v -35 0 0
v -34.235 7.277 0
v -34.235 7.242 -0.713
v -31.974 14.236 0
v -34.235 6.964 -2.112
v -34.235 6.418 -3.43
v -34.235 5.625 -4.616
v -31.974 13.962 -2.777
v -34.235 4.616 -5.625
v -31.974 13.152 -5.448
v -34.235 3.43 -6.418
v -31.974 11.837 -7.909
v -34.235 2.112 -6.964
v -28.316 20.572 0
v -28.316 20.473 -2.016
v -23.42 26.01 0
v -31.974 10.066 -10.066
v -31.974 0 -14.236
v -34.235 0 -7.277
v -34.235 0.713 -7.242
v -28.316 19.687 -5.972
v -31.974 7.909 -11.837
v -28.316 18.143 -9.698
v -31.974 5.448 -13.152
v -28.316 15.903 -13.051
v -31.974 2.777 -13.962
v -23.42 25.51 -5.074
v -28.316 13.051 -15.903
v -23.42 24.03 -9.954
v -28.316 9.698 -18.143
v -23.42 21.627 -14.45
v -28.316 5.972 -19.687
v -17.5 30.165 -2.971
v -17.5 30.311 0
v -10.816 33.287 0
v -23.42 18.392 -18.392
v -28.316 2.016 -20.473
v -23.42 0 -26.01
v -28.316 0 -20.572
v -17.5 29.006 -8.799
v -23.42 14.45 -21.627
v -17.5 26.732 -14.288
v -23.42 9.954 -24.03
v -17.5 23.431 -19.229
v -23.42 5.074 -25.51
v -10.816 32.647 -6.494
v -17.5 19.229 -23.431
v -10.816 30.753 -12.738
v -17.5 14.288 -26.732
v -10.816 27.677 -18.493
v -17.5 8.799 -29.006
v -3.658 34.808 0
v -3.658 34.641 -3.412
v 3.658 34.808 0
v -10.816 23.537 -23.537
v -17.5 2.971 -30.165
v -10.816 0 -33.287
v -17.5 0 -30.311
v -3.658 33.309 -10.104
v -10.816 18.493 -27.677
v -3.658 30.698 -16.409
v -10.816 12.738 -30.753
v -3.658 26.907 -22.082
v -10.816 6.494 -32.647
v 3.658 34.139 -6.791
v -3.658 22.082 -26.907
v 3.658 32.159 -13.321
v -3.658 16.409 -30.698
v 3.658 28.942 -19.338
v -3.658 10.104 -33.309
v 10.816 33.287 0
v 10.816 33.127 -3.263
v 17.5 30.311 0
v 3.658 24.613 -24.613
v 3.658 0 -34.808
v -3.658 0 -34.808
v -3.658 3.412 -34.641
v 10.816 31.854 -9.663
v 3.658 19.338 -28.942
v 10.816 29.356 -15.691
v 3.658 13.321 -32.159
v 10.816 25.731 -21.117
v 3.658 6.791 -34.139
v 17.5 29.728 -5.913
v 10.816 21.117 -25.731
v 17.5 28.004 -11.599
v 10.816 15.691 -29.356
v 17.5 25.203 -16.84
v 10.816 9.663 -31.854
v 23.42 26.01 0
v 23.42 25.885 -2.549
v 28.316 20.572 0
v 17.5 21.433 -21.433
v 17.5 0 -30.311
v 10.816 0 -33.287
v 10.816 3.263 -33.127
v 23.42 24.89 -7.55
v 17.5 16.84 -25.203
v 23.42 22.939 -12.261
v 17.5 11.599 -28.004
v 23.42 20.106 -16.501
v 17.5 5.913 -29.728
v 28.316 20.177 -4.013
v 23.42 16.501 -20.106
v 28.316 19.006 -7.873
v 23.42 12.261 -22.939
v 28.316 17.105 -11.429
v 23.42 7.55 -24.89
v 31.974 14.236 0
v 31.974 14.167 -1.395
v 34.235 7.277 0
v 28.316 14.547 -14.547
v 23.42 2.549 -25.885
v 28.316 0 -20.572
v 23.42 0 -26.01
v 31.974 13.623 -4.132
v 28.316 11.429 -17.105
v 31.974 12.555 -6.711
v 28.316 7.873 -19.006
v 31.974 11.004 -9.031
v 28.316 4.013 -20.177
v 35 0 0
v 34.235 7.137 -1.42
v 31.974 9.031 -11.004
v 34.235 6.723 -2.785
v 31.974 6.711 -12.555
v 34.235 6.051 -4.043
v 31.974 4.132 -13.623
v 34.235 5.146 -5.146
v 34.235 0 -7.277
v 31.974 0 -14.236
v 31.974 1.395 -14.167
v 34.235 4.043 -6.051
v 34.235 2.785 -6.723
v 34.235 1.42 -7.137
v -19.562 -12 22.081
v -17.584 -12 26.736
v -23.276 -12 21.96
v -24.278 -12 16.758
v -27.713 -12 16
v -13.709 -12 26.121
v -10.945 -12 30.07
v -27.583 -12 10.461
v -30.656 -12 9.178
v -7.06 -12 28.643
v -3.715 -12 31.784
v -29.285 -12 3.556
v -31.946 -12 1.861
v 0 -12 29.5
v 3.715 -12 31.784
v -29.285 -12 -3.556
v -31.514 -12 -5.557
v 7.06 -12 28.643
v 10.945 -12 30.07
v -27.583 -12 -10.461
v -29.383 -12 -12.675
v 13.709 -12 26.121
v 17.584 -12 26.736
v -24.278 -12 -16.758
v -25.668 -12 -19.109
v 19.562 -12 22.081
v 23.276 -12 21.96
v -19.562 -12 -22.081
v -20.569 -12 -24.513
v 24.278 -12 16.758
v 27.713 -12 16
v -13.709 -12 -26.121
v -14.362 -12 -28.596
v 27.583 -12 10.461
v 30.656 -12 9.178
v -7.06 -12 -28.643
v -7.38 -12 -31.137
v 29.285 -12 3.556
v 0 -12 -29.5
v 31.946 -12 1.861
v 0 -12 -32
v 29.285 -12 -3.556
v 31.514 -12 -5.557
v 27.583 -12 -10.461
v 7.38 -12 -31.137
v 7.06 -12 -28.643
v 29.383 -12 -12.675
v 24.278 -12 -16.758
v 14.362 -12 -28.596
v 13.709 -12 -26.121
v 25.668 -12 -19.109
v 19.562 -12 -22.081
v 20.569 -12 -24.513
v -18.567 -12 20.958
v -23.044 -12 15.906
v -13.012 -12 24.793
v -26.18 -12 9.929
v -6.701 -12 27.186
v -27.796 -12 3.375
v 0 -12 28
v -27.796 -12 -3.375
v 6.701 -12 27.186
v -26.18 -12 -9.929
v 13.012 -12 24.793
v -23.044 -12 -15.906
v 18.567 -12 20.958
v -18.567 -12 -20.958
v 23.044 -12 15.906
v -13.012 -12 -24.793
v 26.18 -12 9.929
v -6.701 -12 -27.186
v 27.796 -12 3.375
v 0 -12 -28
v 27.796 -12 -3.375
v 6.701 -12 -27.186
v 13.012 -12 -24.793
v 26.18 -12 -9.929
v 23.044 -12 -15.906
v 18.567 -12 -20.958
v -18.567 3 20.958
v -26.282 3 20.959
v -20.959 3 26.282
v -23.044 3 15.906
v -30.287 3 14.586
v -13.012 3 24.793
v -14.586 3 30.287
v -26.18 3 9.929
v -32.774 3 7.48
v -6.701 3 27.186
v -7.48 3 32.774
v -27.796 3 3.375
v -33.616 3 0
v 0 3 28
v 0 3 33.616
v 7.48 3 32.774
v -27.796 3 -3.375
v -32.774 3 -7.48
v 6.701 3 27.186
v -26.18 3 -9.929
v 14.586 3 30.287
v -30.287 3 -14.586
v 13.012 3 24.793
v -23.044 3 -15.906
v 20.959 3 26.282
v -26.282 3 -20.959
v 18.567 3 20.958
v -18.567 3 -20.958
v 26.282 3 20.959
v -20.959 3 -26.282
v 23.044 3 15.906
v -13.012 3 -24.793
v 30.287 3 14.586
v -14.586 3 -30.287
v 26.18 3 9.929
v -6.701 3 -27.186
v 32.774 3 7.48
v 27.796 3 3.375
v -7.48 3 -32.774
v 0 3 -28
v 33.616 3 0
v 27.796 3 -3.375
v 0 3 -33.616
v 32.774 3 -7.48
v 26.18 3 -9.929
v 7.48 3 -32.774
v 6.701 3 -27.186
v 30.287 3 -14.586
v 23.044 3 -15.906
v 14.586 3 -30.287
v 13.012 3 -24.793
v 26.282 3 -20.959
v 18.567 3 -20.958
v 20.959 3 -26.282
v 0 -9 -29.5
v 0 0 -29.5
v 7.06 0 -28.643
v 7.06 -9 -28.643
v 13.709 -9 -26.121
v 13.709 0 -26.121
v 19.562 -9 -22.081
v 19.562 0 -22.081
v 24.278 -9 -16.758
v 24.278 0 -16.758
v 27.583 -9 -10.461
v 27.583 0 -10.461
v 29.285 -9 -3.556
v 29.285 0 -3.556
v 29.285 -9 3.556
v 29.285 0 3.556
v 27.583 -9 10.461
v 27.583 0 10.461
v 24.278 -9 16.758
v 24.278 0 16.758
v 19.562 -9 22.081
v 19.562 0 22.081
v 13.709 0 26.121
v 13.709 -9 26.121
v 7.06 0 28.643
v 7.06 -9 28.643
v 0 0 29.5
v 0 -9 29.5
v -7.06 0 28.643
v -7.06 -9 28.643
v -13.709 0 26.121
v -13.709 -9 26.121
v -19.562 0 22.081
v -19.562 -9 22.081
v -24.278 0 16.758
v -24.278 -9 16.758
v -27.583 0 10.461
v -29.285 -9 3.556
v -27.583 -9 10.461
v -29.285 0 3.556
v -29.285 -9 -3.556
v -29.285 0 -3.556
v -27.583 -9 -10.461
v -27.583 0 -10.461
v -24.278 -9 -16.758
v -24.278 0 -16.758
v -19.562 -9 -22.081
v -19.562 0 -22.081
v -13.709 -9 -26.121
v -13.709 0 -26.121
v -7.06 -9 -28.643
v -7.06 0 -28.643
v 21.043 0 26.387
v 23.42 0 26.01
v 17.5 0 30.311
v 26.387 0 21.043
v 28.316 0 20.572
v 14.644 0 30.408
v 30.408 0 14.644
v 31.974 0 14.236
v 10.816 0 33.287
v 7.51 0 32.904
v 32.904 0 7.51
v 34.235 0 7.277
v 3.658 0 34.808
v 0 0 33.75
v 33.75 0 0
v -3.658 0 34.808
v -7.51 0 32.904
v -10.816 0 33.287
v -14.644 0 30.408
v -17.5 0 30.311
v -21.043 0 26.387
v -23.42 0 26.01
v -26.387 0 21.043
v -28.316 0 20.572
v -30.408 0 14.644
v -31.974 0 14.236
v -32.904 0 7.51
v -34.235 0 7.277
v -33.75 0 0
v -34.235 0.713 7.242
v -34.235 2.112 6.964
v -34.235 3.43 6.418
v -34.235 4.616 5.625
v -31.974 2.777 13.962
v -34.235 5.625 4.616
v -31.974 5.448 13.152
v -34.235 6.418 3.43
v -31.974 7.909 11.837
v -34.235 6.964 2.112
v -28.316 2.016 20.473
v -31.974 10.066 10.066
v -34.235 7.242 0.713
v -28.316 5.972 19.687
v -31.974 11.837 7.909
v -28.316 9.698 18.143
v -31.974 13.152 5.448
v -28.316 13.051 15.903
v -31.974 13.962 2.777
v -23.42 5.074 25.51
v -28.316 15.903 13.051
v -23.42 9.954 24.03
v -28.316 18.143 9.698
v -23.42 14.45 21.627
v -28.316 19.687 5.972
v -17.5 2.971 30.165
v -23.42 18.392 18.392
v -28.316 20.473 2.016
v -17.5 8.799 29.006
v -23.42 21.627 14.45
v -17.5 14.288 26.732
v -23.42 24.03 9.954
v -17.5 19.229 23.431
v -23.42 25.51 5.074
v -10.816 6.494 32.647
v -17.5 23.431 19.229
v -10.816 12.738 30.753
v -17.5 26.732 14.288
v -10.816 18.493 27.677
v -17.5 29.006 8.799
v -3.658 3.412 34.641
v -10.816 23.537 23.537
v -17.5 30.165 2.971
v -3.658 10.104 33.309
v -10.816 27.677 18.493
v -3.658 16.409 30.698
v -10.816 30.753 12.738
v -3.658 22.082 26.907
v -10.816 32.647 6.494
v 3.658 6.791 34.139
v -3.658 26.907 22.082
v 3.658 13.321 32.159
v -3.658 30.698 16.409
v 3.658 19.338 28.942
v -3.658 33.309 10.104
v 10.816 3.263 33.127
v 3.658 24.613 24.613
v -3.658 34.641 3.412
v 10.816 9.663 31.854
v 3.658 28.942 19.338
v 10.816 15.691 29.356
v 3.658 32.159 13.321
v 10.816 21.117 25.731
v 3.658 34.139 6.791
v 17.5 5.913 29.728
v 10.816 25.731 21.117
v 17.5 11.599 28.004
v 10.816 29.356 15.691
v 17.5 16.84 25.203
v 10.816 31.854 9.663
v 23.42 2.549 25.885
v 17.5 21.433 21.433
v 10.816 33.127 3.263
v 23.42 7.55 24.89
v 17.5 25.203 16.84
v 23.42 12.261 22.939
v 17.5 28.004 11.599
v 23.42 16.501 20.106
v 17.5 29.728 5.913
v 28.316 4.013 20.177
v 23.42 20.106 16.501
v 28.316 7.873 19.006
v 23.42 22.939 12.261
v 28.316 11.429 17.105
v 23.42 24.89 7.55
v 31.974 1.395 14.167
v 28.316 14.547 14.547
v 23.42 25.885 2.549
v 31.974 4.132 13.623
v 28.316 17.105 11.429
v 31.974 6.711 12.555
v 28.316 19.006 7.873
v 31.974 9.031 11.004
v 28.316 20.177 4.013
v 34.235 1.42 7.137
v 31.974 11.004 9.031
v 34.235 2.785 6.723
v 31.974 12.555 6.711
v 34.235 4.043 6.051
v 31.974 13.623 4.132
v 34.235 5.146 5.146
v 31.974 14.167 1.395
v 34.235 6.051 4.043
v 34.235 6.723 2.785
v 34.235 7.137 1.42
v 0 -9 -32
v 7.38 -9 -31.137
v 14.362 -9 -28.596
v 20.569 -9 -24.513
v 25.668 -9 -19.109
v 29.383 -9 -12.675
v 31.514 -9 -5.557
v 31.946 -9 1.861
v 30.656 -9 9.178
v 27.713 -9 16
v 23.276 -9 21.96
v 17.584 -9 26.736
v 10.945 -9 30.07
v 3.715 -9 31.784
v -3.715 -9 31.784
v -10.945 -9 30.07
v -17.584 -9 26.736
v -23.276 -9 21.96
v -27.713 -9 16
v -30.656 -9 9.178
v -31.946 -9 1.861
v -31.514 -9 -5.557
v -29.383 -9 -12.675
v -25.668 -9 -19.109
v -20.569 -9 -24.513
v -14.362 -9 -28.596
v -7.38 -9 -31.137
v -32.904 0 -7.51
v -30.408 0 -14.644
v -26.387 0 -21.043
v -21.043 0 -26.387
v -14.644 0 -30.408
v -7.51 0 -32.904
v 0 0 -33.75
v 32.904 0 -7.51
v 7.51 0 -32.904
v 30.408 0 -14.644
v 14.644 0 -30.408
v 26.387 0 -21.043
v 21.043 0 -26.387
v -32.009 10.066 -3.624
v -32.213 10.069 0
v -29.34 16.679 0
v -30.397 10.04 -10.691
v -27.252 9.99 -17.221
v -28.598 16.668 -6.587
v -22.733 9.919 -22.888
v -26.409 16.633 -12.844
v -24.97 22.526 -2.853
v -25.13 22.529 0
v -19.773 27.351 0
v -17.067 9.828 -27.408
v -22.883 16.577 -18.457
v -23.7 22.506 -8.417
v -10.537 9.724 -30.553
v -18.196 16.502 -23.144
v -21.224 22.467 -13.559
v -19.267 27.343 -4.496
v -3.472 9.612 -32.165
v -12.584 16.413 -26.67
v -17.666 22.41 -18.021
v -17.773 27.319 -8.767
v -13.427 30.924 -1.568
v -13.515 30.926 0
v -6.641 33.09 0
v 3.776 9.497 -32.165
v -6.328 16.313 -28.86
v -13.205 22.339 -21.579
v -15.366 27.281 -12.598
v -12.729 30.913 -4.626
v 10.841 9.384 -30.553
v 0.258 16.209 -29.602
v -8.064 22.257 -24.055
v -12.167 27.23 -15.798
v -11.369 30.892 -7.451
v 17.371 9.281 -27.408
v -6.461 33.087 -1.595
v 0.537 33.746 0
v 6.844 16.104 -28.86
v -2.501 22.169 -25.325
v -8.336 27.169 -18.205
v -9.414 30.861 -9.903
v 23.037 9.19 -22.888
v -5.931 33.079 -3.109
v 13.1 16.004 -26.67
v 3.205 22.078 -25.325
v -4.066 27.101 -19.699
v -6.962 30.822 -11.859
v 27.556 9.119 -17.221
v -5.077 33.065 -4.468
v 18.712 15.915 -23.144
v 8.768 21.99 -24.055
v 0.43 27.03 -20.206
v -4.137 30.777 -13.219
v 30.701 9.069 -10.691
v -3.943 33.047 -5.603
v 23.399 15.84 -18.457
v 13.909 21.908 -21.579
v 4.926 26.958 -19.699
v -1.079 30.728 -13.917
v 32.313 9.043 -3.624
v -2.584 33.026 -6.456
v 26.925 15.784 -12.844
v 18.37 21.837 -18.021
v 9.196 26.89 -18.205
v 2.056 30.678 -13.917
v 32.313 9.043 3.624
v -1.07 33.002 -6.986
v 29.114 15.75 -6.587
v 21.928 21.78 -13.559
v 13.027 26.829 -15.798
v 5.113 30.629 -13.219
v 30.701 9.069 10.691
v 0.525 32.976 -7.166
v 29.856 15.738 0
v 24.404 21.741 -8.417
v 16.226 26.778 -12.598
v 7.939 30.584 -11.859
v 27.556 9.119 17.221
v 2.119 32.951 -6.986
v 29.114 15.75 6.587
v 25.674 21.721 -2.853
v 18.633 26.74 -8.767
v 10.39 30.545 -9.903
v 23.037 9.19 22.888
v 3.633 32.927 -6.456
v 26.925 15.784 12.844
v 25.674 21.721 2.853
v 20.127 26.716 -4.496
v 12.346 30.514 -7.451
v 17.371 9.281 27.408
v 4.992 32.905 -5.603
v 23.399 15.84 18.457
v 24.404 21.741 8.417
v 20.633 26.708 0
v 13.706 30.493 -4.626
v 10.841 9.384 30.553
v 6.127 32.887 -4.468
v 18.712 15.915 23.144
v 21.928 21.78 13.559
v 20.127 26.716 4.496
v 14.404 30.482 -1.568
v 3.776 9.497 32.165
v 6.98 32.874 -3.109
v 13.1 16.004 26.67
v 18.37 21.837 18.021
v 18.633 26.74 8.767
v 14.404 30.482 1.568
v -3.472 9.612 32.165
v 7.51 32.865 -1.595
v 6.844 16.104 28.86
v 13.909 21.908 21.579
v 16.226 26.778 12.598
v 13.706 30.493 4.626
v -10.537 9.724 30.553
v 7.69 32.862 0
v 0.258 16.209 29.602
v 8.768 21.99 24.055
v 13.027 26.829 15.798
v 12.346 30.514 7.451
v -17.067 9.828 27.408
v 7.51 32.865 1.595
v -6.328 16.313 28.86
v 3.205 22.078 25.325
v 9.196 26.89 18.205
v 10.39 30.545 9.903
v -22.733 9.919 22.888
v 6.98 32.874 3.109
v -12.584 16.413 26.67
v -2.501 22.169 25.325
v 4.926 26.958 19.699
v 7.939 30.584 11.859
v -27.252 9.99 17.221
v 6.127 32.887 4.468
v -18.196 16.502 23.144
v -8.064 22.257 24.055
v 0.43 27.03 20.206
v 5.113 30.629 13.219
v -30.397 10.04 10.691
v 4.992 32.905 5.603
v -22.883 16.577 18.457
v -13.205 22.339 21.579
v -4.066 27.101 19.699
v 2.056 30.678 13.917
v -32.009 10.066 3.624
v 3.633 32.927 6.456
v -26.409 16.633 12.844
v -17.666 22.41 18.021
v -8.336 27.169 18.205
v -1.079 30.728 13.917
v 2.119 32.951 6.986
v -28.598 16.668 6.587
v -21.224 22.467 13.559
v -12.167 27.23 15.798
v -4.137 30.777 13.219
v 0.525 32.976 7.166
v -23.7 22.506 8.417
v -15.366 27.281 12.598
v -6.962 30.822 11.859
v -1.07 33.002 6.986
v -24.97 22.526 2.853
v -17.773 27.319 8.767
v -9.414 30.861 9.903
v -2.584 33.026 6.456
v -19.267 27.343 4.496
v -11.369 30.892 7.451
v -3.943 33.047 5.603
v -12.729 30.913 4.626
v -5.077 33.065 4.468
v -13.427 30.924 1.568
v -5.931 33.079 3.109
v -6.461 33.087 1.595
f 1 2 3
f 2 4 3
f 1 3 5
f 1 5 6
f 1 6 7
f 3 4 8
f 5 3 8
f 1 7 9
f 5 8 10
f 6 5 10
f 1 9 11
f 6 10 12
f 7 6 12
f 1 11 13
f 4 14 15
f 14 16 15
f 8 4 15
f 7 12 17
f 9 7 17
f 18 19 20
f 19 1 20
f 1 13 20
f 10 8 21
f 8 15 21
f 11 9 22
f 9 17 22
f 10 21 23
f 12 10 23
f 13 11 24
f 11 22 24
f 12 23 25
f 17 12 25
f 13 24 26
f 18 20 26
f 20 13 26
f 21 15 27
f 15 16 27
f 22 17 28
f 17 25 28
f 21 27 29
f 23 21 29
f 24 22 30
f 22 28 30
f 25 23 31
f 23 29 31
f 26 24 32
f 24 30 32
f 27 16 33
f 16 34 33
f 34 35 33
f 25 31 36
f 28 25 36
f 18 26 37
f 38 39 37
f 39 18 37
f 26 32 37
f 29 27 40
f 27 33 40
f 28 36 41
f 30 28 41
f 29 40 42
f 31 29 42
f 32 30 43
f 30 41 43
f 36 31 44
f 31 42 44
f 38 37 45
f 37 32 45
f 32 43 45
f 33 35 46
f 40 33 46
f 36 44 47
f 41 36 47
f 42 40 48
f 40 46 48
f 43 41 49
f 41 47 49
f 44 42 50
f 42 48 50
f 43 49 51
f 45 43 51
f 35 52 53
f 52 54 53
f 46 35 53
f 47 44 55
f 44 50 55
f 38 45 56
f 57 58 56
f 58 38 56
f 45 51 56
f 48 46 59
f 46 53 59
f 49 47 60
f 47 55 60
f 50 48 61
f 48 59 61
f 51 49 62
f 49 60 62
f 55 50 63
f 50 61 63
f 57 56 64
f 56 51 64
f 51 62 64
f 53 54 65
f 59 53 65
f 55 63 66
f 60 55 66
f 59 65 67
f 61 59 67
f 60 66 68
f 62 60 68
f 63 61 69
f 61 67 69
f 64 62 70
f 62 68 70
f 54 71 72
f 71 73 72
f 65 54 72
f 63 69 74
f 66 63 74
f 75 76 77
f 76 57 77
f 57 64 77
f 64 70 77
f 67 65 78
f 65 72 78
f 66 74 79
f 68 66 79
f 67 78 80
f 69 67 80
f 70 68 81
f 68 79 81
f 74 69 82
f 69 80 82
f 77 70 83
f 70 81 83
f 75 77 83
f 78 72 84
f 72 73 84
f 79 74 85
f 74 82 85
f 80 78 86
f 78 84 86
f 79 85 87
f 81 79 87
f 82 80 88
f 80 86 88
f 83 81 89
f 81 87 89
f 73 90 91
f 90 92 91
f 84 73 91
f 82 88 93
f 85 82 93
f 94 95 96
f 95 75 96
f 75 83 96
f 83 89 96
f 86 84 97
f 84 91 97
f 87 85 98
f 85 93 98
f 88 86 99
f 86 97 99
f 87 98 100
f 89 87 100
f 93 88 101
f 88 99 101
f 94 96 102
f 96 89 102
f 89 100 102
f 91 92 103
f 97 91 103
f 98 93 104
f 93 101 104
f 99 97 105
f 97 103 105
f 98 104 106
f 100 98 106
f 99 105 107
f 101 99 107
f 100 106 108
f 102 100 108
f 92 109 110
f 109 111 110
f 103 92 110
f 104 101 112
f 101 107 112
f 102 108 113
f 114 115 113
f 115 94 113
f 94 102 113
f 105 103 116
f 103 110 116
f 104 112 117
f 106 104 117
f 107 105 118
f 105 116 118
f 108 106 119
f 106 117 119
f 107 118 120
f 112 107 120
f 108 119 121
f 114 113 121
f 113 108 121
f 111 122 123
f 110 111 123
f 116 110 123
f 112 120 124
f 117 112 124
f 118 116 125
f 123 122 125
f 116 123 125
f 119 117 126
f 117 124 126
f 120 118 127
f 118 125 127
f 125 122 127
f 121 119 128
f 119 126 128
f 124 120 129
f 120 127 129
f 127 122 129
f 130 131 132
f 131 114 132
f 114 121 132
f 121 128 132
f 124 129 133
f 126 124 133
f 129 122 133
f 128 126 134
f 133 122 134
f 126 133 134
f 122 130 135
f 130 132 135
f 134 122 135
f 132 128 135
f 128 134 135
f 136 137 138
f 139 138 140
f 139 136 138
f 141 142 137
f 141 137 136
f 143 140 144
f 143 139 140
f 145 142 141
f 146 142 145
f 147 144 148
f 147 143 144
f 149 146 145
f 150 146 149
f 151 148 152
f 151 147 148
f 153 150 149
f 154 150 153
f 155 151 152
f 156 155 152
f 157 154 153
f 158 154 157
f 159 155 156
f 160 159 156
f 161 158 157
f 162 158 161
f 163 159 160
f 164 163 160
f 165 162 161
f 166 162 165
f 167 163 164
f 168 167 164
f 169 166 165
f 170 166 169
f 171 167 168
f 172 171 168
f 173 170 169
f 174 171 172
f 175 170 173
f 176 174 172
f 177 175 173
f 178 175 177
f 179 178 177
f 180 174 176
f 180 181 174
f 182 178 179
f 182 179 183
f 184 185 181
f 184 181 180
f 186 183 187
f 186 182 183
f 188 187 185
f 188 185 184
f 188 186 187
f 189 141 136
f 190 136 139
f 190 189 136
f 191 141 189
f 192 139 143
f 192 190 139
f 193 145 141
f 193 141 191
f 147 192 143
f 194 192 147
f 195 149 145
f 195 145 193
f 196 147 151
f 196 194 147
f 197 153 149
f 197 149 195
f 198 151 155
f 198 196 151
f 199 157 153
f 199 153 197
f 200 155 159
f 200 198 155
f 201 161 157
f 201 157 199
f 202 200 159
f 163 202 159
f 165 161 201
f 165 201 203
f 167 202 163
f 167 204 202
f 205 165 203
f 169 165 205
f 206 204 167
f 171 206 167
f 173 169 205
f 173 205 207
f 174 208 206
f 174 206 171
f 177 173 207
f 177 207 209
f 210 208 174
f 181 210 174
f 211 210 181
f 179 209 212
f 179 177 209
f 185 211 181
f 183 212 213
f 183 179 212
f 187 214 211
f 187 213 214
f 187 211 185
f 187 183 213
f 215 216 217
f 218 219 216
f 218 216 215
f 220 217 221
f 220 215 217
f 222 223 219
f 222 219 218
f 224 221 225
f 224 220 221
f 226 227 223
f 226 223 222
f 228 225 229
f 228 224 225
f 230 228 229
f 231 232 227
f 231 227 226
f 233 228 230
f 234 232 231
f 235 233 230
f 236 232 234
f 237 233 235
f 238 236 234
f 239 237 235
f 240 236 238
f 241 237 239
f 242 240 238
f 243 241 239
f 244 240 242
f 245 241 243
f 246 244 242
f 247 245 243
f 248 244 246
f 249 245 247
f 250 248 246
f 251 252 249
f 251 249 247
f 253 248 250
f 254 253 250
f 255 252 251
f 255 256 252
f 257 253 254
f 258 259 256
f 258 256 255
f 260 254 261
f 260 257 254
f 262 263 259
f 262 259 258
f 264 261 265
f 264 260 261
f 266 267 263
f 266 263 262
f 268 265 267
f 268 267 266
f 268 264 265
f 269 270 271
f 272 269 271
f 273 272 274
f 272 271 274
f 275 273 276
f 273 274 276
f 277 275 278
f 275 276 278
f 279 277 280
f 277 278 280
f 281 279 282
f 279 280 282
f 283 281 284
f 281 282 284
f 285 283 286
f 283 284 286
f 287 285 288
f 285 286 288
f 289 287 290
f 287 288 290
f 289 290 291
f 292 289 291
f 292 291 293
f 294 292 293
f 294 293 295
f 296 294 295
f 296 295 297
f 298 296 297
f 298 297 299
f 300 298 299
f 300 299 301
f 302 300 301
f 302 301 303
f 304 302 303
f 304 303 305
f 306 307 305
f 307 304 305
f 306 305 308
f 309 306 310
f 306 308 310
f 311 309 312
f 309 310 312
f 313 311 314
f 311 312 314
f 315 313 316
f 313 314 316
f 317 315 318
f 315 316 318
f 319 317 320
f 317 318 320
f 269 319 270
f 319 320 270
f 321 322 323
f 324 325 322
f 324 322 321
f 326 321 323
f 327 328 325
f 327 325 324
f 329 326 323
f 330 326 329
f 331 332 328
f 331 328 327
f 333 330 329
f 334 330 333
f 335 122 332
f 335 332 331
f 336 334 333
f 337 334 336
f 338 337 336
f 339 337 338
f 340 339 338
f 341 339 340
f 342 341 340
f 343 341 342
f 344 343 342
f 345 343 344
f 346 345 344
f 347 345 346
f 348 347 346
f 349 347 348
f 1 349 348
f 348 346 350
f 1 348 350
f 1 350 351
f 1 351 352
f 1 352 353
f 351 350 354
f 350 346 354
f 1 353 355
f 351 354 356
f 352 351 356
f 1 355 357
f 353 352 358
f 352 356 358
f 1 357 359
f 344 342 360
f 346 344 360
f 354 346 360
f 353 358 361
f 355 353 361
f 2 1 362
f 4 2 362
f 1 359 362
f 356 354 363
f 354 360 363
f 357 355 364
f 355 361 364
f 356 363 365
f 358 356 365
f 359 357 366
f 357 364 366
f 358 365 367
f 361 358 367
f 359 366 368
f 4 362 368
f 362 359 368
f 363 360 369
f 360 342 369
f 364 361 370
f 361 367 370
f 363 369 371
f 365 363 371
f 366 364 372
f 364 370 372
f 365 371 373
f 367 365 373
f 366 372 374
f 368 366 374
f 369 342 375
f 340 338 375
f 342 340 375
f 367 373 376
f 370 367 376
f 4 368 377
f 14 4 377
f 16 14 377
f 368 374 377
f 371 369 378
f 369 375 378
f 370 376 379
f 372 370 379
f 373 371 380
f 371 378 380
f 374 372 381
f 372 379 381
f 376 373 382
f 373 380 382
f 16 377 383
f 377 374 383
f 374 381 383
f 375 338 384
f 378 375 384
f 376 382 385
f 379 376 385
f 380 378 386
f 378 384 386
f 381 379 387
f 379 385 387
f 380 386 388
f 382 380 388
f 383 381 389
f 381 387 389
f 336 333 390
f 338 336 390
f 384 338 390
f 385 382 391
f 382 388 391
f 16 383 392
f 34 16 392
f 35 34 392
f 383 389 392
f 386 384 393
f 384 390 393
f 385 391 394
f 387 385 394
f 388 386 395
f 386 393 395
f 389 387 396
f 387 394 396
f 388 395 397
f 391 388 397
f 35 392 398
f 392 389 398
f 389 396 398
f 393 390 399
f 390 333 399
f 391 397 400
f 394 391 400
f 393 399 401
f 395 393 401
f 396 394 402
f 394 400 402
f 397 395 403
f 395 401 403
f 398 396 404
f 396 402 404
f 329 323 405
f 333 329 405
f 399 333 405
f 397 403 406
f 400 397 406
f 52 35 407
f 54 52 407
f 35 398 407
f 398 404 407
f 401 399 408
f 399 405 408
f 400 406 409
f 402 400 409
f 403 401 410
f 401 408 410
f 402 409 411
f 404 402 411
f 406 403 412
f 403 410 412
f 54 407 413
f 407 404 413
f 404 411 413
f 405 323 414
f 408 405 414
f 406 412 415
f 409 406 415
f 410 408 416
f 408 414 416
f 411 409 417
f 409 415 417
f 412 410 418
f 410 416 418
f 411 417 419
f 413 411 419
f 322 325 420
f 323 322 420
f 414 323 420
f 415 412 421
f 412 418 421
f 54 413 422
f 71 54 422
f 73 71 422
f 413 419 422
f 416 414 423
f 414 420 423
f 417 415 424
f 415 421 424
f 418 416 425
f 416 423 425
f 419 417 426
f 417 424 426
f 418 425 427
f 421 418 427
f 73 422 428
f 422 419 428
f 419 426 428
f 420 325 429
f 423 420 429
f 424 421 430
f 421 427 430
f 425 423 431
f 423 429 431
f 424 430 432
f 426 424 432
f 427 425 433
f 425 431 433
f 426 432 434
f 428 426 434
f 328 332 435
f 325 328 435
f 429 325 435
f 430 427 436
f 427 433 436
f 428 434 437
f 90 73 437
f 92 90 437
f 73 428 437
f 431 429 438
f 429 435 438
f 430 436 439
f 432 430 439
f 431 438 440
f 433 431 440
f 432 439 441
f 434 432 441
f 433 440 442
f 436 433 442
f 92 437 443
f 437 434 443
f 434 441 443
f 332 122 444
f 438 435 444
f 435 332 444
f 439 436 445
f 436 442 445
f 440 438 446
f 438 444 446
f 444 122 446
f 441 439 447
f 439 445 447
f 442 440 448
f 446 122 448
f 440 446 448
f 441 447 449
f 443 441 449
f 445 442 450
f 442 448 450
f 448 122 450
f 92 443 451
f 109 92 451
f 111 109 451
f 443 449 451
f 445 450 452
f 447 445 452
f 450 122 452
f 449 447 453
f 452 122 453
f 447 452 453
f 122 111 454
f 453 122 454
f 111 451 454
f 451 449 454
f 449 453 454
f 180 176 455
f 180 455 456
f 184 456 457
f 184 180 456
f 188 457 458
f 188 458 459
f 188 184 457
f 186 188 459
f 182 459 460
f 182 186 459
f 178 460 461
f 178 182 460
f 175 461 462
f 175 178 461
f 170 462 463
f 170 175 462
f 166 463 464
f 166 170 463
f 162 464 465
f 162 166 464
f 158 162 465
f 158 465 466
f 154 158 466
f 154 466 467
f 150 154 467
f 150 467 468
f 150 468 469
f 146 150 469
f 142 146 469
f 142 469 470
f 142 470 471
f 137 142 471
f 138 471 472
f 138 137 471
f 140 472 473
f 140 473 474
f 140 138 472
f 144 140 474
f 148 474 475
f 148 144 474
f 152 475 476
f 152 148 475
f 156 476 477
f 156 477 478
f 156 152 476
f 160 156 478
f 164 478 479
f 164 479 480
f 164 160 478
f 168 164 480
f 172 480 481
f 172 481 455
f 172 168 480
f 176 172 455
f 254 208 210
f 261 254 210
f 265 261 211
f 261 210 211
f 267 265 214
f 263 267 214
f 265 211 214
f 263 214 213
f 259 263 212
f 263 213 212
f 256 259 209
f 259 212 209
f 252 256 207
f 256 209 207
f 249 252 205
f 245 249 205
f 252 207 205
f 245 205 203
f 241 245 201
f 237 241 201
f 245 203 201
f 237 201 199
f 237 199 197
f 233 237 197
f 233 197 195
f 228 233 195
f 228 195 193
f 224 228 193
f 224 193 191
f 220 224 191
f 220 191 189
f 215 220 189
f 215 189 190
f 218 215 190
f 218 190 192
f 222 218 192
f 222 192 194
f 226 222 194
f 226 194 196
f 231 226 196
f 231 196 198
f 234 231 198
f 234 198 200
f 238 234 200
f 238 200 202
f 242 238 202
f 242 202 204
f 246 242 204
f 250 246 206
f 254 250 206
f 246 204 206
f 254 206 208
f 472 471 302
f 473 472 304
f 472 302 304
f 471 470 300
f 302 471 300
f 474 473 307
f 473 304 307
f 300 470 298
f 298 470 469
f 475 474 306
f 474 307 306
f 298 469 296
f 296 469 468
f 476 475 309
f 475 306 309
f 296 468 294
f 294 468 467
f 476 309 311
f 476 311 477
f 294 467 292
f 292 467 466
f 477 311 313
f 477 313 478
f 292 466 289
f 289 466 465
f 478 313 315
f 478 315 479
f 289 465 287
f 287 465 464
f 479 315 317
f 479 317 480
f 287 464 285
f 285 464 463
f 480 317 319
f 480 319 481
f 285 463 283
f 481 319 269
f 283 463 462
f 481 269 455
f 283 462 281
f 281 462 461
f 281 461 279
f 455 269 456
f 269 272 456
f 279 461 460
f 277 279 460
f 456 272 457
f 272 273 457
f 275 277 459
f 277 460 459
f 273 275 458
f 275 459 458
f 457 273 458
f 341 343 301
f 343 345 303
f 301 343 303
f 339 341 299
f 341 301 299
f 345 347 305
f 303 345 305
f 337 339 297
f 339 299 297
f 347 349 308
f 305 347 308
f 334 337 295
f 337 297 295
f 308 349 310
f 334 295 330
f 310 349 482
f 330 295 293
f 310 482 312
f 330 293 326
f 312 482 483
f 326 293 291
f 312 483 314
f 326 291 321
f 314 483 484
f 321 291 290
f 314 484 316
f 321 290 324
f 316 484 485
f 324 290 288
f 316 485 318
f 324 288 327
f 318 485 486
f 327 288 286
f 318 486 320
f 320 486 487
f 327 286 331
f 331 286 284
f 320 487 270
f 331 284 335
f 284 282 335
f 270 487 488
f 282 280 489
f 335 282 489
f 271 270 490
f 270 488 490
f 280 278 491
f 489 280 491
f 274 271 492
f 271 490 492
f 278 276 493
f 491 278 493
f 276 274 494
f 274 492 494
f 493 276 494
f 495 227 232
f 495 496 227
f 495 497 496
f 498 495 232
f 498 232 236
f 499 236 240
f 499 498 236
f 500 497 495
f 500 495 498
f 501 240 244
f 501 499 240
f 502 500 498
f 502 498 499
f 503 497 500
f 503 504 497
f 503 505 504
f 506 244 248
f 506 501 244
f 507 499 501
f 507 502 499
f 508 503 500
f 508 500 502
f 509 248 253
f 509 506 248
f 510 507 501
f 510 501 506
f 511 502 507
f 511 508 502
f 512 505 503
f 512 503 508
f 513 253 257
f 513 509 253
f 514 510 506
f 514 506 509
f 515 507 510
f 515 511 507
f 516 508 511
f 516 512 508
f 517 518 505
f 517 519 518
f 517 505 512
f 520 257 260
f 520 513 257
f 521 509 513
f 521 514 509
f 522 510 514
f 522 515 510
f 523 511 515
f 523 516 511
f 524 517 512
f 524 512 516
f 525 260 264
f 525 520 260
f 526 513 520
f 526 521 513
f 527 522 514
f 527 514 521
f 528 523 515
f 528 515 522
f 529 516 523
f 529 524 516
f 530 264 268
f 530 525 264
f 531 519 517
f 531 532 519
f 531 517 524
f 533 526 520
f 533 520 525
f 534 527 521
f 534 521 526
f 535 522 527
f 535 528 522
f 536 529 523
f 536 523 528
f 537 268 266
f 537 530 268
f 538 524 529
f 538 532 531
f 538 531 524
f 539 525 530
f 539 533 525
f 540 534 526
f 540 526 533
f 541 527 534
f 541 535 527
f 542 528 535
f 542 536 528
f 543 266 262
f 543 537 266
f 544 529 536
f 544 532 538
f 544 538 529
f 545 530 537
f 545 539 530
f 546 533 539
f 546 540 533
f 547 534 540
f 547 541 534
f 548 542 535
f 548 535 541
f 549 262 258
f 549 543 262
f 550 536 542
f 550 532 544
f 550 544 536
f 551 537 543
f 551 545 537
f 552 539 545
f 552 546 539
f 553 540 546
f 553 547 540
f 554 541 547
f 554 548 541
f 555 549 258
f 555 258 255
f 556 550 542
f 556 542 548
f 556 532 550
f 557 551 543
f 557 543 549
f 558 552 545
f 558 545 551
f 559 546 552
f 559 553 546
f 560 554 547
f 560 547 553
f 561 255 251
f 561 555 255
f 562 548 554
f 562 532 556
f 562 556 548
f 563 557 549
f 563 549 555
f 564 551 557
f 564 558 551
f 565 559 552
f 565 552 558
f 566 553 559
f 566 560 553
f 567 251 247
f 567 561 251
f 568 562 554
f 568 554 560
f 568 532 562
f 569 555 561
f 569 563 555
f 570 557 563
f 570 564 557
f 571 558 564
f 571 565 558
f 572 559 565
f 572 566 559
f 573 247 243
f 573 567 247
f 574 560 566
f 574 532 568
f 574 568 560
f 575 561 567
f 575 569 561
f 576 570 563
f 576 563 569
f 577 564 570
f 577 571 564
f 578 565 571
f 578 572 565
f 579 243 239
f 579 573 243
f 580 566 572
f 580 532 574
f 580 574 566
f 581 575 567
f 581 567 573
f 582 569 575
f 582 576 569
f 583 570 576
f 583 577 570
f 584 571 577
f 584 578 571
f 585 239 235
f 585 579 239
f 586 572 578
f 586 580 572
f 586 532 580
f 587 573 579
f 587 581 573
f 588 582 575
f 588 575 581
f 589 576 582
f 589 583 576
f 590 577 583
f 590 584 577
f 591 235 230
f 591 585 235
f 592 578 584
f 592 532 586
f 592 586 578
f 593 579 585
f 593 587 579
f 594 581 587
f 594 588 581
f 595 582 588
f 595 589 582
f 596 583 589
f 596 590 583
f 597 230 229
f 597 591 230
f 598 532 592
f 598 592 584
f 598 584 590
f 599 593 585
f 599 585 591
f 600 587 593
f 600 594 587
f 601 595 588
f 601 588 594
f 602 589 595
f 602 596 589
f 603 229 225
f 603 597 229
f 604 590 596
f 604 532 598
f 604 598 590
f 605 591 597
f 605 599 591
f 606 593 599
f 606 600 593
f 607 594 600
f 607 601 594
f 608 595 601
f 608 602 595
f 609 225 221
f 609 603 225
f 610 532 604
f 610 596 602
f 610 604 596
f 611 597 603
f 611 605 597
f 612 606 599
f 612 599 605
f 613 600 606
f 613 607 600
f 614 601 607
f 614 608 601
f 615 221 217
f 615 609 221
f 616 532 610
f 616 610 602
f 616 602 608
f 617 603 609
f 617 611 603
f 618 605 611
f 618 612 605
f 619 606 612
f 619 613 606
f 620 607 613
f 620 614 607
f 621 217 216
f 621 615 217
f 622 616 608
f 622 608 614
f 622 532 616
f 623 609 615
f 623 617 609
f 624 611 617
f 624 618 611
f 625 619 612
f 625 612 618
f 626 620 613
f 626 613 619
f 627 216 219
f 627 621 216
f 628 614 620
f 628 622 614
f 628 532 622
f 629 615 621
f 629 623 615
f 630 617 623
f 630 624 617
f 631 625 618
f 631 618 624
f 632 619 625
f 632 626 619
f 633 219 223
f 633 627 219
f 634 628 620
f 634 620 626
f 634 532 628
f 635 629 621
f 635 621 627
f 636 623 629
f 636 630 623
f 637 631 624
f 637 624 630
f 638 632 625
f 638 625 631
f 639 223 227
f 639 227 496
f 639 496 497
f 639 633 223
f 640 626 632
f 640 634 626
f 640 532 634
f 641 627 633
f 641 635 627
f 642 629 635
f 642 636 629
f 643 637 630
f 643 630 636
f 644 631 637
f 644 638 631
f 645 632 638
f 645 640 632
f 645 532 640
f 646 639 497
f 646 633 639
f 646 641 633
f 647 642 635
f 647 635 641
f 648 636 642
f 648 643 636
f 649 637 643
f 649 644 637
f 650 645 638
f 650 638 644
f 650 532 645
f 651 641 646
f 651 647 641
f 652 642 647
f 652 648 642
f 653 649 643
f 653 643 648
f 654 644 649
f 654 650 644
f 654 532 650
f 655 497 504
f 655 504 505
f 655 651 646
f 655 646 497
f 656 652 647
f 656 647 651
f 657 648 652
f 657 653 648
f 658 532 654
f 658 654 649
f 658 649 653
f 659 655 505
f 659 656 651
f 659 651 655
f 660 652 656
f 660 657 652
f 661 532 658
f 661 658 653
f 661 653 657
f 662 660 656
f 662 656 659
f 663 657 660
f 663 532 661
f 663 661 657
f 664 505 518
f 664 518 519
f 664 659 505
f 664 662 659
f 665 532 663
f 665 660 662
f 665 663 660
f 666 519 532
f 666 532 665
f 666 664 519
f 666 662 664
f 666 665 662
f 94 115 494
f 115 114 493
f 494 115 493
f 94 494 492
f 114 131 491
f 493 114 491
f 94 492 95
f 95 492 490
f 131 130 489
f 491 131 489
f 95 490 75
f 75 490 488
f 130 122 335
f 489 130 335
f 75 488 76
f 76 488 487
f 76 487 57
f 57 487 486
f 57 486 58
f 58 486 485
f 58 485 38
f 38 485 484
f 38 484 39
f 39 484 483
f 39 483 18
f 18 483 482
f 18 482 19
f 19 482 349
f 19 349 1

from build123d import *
from build123d.topology import SkipClean

# Parameters (mm, degrees)
CUT_REVOLVE2_ANGLE      = 180
BOSS_EXTRUDE1_START     = -0.0001
BOSS_EXTRUDE1_OUTLINE_R = 33.75
BOSS_EXTRUDE1_DEPTH     = 3.0001
SKETCH7_R               = 29.5
BOSS_EXTRUDE2_DEPTH     = 12
SKETCH8_R               = 32
BOSS_EXTRUDE3_DEPTH     = 3
SKETCH9_R               = 28
CUT_EXTRUDE1_DEPTH      = 16


# Read off the part's stored shape, not the designer's step: Boss-Extrude1
with BuildPart() as part:
    # Sketch1 → Revolve1 (revolve)
    with BuildSketch(Plane.XY):
        with BuildLine():
            Line((35, 0), (-35, 0))
            ThreePointArc((-35, 0), (0, 35), (35, 0))
        make_face()
    revolve(axis=Axis((35, 0, 0), (-1, 0, 0)))

    # Sketch3 → Cut-Revolve1 (revolve, cut)
    with BuildSketch(Plane.XY):
        with BuildLine():
            Line((0.536808441, 33.745730644), (-0.536808441, -33.745730644))
            ThreePointArc((-0.536808441, -33.745730644), (-33.745730644, 0.536808441), (0.536808441, 33.745730644))
        make_face()
    revolve(axis=Axis((0.536808441, 33.745730644, 0), (-0.015905435294566866, -0.9998735005629914, 0)), mode=Mode.SUBTRACT)

    # Sketch5 → Cut-Revolve2 (revolve, cut)
    with SkipClean():  # the faces are left unmerged after this step: merging them gives an invalid solid
        with BuildSketch(Plane(origin=(0, 0, 0), x_dir=(1, 0, 0), z_dir=(0, 1, 0))):
            with BuildLine():
                Line((-35, 0), (35, 0))
                ThreePointArc((35, 0), (0, -35), (-35, 0))
            make_face()
        revolve(axis=Axis((-35, 0, 0), (1, 0, 0)), revolution_arc=CUT_REVOLVE2_ANGLE, mode=Mode.SUBTRACT)

    # Boss-Extrude1 outline → Boss-Extrude1 (add)
    with SkipClean():  # the faces are left unmerged after this step: merging them gives an invalid solid
        with BuildSketch(Plane(origin=(0, 0, 0), x_dir=(1, 0, 0), z_dir=(0, 1, 0)).offset(BOSS_EXTRUDE1_START)):
            Circle(BOSS_EXTRUDE1_OUTLINE_R)
        extrude(amount=BOSS_EXTRUDE1_DEPTH)

    # Sketch7 → Boss-Extrude2 (add)
    with SkipClean():  # the faces are left unmerged after this step: merging them gives an invalid solid
        with BuildSketch(Plane.XZ.offset(0.0001)):
            with Locations(Location((0, 0, 0), (0, 0, 270))):
                Circle(SKETCH7_R)
        extrude(amount=BOSS_EXTRUDE2_DEPTH)

    # Sketch8 → Boss-Extrude3 (add)
    with SkipClean():  # the faces are left unmerged after this step: merging them gives an invalid solid
        with BuildSketch(Plane.XZ.offset(12.0001)):
            with Locations(Location((0, 0, 0), (0, 0, 270))):
                Circle(SKETCH8_R)
        extrude(amount=-BOSS_EXTRUDE3_DEPTH)

    # Sketch9 → Cut-Extrude1 (cut)
    with SkipClean():  # the faces are left unmerged after this step: merging them gives an invalid solid
        with BuildSketch(Plane.XZ.offset(12.0001)):
            with Locations(Location((0, 0, 0), (0, 0, 270))):
                Circle(SKETCH9_R)
        extrude(amount=-CUT_EXTRUDE1_DEPTH, mode=Mode.SUBTRACT)


solid = part.part
